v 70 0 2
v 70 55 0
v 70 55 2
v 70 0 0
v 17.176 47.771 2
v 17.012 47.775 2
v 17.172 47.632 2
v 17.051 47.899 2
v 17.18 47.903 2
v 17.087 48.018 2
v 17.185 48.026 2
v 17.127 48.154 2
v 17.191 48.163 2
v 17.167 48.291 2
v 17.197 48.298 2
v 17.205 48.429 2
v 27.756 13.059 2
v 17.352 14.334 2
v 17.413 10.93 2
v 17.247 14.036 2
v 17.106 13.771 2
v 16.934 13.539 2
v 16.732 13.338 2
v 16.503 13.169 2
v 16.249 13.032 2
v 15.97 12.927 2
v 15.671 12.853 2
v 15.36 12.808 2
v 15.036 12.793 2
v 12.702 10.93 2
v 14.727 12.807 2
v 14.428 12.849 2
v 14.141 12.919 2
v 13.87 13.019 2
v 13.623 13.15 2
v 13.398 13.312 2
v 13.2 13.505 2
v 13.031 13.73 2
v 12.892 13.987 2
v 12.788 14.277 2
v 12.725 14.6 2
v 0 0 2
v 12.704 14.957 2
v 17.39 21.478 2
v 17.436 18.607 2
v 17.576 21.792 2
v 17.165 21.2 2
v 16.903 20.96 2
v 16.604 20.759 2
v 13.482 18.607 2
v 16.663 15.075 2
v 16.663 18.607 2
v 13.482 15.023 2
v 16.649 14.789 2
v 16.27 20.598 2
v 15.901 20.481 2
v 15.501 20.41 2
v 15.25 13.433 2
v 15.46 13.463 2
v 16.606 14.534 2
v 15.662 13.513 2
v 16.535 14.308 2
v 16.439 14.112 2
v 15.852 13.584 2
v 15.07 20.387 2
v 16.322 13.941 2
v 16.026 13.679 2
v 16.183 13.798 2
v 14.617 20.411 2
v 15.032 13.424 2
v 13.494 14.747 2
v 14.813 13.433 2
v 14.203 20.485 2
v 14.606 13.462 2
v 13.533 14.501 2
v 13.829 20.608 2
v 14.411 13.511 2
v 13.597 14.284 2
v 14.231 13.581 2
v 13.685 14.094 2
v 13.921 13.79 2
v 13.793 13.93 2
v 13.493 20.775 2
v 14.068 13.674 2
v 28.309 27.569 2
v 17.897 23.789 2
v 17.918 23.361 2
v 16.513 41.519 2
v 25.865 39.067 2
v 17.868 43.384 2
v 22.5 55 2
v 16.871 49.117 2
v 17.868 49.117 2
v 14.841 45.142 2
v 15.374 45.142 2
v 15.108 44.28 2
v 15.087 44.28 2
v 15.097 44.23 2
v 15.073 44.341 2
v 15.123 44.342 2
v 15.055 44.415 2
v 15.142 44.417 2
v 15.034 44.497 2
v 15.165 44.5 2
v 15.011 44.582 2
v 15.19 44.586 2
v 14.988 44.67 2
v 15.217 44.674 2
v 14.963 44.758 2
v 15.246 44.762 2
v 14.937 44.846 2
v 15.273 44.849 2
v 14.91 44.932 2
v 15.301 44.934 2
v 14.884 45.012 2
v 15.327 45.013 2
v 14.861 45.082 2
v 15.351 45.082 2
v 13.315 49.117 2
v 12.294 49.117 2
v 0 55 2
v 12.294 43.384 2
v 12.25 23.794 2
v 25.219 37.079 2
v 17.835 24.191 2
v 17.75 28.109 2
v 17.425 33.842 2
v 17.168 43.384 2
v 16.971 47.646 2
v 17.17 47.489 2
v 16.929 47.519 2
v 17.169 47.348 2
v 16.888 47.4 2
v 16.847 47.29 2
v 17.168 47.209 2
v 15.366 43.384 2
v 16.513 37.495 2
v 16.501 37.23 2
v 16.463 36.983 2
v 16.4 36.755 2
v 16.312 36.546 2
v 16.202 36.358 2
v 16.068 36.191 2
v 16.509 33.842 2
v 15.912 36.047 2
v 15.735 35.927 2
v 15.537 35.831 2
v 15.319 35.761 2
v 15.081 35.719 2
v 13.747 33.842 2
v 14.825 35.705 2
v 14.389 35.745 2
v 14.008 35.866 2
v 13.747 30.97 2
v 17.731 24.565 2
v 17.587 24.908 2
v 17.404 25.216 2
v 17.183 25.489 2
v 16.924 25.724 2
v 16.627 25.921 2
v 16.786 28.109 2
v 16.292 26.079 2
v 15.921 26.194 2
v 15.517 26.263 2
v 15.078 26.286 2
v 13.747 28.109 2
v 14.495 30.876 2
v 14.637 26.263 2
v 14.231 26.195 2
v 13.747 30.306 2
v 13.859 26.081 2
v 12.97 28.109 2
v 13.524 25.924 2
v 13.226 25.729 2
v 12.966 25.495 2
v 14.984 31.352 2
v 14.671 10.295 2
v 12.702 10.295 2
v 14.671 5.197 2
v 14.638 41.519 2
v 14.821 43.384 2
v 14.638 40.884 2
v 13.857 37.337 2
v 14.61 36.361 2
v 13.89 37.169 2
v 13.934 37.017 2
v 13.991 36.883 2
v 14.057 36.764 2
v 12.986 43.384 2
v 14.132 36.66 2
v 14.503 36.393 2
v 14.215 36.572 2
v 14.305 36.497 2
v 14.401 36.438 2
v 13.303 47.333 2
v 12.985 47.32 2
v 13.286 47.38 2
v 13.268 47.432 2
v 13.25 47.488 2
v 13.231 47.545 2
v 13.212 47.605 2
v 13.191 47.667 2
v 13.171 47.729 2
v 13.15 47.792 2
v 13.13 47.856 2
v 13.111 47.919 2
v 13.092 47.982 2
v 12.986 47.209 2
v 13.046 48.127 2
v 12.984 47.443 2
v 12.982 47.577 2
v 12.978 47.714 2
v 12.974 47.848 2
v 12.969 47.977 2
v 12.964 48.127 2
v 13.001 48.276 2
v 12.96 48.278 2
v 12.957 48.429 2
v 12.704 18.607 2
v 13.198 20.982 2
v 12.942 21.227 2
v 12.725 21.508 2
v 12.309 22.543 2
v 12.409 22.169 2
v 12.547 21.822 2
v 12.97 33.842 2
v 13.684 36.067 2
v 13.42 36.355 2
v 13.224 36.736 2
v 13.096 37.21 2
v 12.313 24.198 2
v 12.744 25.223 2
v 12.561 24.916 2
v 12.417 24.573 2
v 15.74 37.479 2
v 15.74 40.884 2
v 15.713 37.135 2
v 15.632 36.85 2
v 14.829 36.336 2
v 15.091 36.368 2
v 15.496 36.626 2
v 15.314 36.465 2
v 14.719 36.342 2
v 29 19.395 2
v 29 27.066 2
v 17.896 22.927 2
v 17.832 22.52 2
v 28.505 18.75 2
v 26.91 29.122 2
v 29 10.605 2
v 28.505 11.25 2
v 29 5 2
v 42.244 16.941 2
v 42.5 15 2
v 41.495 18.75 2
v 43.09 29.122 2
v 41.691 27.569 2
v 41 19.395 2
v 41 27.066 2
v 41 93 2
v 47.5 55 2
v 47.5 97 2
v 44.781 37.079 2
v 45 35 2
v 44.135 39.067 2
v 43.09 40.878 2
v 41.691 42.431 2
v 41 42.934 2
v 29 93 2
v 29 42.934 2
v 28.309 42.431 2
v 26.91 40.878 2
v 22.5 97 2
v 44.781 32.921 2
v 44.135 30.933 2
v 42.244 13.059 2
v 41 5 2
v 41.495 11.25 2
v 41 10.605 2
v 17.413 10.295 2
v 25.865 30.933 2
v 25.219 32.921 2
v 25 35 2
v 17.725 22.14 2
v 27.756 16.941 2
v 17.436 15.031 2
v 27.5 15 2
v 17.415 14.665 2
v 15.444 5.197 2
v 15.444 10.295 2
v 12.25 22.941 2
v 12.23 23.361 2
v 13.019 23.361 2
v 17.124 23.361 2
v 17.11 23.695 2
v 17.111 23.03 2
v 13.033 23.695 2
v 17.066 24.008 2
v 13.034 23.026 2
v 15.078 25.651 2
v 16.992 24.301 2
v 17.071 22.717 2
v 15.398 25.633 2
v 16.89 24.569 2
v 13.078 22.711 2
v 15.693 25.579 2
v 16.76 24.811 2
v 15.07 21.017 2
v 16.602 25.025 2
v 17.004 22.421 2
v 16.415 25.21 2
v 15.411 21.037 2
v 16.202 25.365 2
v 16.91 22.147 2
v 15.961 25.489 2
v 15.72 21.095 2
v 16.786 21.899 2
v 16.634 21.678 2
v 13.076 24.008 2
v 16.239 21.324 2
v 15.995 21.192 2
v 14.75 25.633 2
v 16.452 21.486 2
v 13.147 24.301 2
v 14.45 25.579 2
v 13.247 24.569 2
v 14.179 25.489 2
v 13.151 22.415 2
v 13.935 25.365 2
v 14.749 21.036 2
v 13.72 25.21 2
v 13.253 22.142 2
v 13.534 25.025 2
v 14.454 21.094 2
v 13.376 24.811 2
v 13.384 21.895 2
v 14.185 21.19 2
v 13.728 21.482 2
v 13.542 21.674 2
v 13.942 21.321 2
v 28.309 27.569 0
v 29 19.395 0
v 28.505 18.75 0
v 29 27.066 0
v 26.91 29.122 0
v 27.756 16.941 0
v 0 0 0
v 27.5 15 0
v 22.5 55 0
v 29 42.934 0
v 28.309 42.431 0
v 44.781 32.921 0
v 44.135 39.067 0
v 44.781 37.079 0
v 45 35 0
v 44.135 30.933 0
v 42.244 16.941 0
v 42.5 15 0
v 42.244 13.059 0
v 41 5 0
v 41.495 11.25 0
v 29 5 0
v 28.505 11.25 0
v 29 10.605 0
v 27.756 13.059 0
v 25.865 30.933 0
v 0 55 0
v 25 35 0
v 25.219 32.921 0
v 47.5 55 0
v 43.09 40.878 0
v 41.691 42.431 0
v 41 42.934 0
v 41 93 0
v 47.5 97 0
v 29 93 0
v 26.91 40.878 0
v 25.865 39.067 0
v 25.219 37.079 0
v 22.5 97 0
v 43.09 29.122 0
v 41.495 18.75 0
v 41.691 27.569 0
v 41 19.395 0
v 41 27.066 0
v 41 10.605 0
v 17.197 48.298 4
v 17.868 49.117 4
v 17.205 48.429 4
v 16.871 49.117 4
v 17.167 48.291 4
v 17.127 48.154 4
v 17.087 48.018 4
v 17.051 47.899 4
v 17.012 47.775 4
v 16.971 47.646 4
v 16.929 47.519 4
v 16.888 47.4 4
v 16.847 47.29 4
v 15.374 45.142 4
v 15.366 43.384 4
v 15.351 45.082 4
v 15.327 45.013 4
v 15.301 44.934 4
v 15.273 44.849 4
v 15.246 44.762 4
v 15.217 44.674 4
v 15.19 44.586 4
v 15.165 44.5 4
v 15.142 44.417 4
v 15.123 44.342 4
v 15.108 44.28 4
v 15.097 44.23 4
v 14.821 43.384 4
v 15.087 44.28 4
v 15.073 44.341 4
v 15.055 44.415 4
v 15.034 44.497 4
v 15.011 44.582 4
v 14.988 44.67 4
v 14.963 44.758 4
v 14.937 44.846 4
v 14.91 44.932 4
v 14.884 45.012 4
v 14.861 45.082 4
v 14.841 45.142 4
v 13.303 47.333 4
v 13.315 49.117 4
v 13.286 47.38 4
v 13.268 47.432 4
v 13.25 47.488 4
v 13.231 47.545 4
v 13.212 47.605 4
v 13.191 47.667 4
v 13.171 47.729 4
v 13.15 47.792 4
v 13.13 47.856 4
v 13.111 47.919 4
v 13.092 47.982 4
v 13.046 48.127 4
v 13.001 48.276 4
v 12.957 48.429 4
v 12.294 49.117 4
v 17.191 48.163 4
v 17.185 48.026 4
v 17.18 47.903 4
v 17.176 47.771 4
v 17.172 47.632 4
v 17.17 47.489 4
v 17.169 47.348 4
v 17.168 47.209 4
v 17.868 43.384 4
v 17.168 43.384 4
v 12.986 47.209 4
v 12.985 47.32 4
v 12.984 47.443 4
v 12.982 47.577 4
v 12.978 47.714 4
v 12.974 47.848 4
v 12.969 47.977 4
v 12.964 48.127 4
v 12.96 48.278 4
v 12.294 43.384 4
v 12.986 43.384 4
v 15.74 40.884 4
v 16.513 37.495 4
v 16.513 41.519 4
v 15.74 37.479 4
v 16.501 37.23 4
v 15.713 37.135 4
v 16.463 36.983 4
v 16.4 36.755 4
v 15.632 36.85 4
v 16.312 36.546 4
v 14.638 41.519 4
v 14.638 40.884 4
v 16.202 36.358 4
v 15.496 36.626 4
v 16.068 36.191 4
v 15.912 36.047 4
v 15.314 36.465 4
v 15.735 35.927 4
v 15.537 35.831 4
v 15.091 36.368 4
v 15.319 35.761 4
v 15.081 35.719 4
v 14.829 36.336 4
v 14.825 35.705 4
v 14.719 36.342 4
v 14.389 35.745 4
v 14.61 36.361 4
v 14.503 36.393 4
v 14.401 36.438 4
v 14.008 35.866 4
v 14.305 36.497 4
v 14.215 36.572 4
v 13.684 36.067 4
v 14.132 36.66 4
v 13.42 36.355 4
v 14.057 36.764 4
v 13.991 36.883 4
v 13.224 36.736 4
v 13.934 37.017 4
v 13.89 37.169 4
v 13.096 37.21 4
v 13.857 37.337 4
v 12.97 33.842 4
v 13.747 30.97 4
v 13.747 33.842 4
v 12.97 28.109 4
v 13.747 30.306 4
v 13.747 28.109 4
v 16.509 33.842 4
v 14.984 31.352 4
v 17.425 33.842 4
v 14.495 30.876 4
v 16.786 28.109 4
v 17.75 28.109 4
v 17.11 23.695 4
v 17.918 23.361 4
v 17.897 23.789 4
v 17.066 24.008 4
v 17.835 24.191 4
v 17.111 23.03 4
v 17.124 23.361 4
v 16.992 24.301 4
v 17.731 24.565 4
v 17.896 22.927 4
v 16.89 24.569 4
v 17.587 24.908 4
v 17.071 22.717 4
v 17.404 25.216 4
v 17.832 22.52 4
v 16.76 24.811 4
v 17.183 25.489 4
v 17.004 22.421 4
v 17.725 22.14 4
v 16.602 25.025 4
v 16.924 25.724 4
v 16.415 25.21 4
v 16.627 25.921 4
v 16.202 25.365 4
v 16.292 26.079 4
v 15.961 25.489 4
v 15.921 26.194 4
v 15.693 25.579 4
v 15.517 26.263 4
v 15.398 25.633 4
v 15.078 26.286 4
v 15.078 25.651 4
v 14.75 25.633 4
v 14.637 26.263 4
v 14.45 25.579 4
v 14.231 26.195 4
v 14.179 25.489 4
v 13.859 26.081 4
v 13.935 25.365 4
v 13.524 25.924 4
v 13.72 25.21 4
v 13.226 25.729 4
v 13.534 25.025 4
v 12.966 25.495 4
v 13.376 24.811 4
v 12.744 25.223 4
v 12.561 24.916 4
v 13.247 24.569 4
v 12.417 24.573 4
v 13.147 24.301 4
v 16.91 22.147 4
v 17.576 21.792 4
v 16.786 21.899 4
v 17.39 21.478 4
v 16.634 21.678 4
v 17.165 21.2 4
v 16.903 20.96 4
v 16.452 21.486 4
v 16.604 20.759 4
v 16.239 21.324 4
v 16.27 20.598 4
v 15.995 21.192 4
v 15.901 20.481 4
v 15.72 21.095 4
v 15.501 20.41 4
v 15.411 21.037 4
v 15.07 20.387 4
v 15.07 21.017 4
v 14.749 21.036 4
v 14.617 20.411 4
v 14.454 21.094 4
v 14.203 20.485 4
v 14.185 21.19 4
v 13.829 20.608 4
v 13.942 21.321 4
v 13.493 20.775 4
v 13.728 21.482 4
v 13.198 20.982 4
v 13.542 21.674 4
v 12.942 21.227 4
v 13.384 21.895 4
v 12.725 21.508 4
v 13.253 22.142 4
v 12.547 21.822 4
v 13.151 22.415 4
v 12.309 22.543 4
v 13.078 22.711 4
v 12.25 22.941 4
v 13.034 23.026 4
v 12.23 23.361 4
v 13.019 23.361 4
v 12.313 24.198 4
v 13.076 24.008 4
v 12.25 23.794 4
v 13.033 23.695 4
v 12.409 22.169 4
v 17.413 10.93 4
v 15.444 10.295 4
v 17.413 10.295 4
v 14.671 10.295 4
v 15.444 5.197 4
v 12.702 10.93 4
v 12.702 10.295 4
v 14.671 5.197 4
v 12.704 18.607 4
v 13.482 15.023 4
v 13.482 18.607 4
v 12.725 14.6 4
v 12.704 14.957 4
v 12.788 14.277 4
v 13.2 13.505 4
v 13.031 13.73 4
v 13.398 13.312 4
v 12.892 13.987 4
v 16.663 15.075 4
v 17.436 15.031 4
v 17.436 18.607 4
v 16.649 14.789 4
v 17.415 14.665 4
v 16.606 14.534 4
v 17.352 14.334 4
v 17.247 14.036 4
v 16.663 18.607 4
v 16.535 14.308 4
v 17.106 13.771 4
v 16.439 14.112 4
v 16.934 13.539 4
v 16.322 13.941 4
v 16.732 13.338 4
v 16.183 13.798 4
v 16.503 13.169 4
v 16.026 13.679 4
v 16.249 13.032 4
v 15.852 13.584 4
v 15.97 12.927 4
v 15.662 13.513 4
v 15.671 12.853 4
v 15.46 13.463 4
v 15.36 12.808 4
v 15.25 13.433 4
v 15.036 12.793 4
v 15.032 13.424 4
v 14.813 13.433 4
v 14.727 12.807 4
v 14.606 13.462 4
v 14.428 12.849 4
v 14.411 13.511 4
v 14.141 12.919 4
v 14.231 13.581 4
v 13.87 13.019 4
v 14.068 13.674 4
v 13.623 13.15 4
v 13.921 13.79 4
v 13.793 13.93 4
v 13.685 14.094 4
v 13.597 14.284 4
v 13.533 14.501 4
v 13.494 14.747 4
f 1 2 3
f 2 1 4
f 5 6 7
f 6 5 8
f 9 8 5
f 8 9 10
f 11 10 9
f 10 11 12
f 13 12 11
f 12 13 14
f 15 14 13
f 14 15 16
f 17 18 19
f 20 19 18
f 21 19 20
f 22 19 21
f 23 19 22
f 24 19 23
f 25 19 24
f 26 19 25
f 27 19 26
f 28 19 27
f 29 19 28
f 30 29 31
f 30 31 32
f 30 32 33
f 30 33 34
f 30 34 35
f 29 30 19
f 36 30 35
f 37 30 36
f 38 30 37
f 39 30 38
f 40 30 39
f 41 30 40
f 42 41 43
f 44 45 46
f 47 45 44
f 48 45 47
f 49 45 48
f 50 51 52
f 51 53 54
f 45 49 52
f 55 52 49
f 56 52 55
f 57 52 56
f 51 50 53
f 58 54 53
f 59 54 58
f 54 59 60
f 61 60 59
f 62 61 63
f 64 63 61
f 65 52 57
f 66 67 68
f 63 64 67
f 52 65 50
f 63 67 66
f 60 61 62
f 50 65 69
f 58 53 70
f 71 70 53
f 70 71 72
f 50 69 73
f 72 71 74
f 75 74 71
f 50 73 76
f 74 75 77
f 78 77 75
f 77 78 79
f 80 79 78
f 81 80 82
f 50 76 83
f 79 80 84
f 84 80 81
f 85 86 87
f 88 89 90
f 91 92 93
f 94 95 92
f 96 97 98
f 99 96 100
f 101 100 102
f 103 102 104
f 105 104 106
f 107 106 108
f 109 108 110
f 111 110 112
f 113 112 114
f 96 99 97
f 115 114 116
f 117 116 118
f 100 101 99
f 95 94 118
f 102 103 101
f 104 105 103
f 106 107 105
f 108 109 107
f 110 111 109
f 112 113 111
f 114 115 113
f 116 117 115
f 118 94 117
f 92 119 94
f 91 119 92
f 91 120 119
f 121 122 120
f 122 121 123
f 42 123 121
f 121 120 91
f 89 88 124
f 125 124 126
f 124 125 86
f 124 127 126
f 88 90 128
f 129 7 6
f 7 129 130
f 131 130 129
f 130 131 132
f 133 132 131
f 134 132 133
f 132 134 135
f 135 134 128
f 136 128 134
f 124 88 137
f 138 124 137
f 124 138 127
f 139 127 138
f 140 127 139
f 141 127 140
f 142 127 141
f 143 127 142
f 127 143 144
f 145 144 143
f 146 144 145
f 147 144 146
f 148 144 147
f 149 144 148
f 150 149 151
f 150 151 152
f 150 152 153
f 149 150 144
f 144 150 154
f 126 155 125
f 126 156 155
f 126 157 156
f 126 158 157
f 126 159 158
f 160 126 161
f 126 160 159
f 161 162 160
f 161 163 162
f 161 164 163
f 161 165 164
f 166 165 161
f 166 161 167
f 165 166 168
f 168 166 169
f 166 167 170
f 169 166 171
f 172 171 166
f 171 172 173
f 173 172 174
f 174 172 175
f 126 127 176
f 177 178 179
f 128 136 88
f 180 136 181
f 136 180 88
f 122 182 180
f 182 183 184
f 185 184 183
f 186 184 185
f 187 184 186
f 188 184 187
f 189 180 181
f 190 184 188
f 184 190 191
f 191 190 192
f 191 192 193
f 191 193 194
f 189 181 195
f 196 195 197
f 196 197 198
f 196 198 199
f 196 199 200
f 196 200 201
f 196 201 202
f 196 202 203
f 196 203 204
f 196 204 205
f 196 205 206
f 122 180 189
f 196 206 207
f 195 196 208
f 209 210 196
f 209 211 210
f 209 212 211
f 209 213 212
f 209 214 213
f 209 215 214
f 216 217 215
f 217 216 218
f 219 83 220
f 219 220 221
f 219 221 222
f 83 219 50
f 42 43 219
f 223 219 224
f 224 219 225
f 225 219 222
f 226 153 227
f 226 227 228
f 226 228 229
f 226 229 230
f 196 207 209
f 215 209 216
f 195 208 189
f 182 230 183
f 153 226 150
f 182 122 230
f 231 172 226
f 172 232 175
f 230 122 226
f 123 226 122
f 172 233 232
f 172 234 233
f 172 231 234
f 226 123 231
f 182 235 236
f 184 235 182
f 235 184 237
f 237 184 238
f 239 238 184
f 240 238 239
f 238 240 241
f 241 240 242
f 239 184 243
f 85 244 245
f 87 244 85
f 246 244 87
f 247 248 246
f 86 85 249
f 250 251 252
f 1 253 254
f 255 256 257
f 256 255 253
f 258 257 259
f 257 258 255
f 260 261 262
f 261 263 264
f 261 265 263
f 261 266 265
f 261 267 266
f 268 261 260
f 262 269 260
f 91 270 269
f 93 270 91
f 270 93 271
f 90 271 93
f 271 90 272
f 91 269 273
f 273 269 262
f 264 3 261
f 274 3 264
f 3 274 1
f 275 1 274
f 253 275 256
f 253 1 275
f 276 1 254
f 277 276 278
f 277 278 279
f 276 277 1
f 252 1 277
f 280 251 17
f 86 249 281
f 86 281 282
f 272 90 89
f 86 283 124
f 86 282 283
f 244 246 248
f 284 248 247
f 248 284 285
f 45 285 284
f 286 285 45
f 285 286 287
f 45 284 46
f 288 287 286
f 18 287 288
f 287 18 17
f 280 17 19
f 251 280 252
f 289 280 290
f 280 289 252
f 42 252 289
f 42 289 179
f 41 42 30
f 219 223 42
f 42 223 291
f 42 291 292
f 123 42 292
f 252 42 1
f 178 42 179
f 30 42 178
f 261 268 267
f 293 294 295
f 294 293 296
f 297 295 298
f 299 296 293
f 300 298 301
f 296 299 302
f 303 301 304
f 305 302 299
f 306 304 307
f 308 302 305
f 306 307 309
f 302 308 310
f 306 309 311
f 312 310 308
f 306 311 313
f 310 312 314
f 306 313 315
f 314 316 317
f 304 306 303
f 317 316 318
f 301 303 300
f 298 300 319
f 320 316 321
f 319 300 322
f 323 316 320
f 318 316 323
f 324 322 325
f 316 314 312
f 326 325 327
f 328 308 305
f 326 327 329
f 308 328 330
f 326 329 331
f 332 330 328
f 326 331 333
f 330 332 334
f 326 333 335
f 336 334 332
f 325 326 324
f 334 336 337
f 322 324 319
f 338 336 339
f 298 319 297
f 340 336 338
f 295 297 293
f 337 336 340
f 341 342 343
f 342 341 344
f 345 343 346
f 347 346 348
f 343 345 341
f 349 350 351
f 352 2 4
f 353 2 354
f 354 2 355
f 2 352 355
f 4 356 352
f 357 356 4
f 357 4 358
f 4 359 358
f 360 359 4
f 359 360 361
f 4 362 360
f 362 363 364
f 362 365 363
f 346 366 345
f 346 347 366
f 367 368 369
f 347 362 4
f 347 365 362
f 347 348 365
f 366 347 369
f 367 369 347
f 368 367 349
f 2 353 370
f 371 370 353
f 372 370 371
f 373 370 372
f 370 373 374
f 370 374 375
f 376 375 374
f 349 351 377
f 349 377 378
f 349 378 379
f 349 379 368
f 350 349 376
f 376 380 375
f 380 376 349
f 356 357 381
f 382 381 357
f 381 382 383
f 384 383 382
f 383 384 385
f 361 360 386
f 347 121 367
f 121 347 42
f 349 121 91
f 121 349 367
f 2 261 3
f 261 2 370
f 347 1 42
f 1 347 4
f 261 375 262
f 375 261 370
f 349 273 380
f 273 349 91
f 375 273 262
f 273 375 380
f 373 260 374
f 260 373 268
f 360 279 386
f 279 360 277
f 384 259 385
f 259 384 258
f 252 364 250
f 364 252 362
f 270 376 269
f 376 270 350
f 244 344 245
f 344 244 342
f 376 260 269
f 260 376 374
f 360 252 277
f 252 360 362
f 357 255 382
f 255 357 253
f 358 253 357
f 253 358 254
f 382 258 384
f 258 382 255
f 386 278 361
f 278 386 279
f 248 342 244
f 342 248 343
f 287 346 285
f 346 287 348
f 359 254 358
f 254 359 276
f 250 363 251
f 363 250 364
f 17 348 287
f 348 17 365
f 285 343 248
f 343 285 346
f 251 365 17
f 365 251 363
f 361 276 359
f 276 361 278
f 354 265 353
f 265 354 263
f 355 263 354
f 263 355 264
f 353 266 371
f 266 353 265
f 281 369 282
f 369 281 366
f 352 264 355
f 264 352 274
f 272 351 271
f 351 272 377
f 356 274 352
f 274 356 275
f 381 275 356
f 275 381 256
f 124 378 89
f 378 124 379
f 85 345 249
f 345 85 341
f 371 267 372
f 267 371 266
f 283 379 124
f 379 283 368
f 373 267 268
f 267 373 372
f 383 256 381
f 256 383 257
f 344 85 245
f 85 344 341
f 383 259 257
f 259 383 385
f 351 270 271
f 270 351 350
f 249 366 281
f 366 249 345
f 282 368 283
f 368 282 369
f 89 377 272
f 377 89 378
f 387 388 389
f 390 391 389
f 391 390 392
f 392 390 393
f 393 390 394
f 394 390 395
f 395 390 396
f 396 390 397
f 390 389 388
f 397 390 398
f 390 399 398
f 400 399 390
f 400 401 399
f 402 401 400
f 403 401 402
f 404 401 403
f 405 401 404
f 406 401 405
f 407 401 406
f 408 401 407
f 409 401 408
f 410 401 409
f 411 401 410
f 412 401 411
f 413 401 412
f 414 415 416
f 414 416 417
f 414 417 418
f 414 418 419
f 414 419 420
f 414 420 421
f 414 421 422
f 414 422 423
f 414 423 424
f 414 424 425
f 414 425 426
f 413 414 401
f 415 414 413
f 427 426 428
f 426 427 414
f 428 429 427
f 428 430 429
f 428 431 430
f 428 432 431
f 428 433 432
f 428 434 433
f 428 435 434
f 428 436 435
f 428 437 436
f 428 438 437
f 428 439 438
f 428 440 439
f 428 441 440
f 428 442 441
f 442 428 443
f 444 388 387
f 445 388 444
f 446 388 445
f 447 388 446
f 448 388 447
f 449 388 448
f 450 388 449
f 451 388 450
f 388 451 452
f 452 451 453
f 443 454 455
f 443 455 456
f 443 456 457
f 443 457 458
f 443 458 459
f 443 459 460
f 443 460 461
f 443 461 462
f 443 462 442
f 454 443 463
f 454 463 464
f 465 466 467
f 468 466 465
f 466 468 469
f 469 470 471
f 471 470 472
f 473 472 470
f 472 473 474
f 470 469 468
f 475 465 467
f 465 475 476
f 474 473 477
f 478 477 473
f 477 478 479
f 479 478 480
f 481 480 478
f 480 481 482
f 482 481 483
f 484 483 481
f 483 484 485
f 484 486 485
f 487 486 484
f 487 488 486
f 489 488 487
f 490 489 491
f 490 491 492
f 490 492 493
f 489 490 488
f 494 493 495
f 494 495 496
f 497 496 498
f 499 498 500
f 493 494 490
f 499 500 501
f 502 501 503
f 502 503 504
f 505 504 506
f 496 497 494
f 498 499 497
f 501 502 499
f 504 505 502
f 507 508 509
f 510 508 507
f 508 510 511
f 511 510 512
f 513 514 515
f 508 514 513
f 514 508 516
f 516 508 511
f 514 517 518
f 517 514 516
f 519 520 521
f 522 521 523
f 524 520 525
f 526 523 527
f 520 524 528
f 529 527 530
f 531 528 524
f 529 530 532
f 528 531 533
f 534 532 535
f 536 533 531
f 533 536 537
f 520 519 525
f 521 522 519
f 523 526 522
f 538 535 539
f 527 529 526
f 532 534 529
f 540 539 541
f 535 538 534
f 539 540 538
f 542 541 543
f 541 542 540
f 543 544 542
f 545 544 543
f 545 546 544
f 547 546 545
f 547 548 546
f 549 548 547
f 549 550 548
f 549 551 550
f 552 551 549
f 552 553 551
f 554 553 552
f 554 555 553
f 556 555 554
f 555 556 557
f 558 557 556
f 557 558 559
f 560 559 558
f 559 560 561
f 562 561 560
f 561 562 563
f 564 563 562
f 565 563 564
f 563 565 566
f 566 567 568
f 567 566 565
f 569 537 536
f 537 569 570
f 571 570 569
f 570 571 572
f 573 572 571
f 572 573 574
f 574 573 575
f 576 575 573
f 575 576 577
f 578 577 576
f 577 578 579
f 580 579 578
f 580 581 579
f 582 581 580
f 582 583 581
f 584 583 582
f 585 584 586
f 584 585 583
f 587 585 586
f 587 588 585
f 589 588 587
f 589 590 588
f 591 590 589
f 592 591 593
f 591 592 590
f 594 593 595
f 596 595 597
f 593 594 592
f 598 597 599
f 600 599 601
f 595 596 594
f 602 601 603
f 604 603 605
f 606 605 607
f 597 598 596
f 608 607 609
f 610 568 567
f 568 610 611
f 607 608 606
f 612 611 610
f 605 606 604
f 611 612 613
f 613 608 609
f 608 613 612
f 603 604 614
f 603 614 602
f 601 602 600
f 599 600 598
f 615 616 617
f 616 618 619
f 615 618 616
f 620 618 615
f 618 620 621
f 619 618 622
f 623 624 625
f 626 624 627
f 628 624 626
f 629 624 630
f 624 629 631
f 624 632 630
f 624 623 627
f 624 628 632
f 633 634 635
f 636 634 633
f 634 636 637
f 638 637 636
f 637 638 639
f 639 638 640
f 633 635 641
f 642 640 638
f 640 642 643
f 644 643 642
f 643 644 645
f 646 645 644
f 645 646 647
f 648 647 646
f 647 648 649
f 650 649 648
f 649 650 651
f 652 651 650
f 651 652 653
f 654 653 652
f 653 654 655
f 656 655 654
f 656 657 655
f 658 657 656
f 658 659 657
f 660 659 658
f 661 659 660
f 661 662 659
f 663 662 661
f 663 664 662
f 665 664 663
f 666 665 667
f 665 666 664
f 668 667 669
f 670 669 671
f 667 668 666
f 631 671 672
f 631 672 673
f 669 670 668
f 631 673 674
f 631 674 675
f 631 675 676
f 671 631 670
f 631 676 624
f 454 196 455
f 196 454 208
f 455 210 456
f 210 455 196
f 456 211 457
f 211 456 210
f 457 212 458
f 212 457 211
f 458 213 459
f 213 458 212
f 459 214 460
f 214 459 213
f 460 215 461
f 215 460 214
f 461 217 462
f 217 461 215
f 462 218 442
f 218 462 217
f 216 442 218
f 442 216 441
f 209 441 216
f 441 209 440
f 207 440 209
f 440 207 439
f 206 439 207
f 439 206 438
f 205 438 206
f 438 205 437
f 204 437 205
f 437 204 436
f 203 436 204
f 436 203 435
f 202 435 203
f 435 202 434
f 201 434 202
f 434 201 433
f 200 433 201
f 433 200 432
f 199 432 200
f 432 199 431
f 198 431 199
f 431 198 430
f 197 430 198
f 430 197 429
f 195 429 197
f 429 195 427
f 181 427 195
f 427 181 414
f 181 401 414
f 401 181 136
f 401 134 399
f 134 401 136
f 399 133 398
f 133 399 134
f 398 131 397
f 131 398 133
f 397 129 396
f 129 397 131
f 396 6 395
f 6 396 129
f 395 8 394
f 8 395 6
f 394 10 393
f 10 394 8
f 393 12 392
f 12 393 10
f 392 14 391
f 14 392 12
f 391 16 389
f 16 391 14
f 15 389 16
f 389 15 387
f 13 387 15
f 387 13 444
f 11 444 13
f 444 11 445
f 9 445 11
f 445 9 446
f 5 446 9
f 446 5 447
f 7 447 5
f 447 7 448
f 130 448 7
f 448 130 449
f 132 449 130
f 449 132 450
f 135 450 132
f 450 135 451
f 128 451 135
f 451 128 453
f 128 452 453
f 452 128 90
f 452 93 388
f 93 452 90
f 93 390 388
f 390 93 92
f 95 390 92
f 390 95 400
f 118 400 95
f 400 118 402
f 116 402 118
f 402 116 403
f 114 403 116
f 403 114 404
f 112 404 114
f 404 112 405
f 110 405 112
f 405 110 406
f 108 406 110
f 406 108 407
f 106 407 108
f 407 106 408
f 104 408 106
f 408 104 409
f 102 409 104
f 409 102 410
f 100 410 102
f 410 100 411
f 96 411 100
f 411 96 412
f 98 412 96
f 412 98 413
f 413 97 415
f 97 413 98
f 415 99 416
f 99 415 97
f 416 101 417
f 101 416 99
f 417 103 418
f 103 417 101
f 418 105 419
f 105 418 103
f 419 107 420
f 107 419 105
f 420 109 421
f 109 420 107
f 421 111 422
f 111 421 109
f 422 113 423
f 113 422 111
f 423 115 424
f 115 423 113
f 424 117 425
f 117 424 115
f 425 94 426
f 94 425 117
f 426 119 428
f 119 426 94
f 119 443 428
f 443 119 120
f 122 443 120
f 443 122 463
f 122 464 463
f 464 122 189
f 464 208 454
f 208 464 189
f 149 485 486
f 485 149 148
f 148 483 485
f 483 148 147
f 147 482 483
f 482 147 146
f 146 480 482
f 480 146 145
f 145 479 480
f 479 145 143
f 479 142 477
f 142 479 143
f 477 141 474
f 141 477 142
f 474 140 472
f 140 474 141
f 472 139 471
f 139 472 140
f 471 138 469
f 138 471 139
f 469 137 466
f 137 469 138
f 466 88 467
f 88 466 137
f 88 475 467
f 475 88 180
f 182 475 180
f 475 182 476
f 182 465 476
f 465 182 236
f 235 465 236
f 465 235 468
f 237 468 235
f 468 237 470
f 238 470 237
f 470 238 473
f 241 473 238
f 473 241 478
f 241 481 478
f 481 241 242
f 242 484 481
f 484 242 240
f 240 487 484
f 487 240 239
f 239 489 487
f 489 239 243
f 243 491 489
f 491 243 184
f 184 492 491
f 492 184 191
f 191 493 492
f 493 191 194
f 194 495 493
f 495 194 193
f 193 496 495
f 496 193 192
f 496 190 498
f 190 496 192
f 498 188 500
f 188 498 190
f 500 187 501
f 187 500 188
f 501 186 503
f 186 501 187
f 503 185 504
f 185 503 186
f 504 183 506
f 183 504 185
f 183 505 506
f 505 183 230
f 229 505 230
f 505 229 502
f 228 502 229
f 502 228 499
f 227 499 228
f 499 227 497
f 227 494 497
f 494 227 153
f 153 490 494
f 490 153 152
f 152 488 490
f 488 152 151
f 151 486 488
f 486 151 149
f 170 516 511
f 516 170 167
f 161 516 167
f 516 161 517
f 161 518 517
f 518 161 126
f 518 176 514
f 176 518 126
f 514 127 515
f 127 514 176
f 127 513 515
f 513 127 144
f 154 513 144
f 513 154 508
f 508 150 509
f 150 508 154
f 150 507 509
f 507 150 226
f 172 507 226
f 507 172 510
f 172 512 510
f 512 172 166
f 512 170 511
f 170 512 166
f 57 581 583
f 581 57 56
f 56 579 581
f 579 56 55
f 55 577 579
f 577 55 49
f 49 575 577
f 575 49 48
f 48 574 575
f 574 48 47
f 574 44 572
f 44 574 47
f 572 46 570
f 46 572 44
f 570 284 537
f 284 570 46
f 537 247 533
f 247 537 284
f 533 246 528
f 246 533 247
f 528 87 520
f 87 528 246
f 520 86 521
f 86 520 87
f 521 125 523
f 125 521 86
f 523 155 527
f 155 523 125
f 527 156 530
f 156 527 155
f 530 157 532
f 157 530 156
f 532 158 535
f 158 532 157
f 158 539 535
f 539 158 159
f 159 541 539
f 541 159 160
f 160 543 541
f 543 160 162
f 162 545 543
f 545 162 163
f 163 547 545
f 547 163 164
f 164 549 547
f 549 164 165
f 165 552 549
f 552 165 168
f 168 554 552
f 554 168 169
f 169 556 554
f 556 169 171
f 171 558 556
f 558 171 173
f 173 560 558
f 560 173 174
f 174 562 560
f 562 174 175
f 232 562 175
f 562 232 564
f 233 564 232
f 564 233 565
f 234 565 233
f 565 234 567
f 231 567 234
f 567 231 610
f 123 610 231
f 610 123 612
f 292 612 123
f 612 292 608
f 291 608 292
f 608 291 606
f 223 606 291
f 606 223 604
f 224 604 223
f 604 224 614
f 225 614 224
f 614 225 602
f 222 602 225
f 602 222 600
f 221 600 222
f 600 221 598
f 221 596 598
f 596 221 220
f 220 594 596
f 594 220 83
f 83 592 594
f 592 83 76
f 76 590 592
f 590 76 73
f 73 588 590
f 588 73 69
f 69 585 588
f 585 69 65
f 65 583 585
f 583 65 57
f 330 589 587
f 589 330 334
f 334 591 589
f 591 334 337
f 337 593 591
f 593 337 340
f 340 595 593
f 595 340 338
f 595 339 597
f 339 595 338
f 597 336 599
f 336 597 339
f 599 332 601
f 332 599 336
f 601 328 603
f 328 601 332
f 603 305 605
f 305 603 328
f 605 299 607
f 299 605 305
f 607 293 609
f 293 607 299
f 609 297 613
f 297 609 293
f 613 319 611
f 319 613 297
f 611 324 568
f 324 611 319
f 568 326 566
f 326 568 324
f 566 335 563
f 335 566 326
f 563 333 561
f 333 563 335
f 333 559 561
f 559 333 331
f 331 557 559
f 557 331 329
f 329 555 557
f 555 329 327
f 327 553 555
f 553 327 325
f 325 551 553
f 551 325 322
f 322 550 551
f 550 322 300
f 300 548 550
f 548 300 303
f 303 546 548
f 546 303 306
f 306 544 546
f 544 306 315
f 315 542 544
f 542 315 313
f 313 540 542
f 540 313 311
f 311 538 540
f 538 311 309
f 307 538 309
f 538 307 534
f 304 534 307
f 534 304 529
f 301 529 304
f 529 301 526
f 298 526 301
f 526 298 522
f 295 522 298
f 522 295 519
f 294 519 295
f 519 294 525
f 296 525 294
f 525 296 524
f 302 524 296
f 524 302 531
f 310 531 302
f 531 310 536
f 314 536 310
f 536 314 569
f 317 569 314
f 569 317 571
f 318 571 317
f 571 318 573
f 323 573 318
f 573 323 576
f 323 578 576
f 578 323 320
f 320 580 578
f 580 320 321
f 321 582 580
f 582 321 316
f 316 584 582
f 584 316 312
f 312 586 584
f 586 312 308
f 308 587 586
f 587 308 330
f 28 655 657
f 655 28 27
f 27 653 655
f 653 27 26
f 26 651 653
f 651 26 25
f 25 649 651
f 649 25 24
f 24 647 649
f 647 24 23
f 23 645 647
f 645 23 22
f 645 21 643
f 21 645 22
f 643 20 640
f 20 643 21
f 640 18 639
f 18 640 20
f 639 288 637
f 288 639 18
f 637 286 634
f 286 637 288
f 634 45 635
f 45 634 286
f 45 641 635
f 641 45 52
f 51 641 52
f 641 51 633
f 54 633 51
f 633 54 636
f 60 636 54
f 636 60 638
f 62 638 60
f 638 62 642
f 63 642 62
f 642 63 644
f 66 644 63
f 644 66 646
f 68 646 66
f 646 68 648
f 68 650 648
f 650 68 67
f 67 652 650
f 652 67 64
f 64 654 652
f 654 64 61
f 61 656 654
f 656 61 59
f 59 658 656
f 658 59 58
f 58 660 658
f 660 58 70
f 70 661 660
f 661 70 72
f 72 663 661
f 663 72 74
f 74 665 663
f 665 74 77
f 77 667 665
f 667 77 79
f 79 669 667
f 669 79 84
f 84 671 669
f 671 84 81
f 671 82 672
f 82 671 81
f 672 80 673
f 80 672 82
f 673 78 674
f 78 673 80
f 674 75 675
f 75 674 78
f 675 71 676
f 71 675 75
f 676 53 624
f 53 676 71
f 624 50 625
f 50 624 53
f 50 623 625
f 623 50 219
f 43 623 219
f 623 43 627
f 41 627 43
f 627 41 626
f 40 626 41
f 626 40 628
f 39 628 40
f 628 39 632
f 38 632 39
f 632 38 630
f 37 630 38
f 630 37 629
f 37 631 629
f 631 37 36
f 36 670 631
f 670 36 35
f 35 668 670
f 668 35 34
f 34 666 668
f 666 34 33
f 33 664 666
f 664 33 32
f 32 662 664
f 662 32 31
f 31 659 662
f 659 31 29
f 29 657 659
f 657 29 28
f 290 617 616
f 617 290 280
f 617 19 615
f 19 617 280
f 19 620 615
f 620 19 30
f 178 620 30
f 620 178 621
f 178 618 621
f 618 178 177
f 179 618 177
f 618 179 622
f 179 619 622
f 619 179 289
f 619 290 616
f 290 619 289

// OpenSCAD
difference() {	
	difference() {
		
		difference(){
			union(){
				cube([70,55,2]);
				translate([22.5,55,0])
				cube([25,42,2]);
			}
			translate([29,5,0])
			cube([12,88,4]);
		}
		
		translate([35,15,0])
		cylinder(r=7.5, h=2,center=false);
	}
		translate([35,35,0])
		cylinder(r=10, h=2,center=false);
	}



	 text = "MJKOUT";
 font = "Liberation Sans";
 
 
translate([15,50,0])
     linear_extrude(height =4) {
       text(text = str(text), font = font, size = 6, direction="ttb");
     }
   
 

/* text2 = "PokiGo";
translate([55,50,0])
     linear_extrude(height =4) {
       text(text = str(text2), font = font, size = 6, direction="ttb");
     }
   */
